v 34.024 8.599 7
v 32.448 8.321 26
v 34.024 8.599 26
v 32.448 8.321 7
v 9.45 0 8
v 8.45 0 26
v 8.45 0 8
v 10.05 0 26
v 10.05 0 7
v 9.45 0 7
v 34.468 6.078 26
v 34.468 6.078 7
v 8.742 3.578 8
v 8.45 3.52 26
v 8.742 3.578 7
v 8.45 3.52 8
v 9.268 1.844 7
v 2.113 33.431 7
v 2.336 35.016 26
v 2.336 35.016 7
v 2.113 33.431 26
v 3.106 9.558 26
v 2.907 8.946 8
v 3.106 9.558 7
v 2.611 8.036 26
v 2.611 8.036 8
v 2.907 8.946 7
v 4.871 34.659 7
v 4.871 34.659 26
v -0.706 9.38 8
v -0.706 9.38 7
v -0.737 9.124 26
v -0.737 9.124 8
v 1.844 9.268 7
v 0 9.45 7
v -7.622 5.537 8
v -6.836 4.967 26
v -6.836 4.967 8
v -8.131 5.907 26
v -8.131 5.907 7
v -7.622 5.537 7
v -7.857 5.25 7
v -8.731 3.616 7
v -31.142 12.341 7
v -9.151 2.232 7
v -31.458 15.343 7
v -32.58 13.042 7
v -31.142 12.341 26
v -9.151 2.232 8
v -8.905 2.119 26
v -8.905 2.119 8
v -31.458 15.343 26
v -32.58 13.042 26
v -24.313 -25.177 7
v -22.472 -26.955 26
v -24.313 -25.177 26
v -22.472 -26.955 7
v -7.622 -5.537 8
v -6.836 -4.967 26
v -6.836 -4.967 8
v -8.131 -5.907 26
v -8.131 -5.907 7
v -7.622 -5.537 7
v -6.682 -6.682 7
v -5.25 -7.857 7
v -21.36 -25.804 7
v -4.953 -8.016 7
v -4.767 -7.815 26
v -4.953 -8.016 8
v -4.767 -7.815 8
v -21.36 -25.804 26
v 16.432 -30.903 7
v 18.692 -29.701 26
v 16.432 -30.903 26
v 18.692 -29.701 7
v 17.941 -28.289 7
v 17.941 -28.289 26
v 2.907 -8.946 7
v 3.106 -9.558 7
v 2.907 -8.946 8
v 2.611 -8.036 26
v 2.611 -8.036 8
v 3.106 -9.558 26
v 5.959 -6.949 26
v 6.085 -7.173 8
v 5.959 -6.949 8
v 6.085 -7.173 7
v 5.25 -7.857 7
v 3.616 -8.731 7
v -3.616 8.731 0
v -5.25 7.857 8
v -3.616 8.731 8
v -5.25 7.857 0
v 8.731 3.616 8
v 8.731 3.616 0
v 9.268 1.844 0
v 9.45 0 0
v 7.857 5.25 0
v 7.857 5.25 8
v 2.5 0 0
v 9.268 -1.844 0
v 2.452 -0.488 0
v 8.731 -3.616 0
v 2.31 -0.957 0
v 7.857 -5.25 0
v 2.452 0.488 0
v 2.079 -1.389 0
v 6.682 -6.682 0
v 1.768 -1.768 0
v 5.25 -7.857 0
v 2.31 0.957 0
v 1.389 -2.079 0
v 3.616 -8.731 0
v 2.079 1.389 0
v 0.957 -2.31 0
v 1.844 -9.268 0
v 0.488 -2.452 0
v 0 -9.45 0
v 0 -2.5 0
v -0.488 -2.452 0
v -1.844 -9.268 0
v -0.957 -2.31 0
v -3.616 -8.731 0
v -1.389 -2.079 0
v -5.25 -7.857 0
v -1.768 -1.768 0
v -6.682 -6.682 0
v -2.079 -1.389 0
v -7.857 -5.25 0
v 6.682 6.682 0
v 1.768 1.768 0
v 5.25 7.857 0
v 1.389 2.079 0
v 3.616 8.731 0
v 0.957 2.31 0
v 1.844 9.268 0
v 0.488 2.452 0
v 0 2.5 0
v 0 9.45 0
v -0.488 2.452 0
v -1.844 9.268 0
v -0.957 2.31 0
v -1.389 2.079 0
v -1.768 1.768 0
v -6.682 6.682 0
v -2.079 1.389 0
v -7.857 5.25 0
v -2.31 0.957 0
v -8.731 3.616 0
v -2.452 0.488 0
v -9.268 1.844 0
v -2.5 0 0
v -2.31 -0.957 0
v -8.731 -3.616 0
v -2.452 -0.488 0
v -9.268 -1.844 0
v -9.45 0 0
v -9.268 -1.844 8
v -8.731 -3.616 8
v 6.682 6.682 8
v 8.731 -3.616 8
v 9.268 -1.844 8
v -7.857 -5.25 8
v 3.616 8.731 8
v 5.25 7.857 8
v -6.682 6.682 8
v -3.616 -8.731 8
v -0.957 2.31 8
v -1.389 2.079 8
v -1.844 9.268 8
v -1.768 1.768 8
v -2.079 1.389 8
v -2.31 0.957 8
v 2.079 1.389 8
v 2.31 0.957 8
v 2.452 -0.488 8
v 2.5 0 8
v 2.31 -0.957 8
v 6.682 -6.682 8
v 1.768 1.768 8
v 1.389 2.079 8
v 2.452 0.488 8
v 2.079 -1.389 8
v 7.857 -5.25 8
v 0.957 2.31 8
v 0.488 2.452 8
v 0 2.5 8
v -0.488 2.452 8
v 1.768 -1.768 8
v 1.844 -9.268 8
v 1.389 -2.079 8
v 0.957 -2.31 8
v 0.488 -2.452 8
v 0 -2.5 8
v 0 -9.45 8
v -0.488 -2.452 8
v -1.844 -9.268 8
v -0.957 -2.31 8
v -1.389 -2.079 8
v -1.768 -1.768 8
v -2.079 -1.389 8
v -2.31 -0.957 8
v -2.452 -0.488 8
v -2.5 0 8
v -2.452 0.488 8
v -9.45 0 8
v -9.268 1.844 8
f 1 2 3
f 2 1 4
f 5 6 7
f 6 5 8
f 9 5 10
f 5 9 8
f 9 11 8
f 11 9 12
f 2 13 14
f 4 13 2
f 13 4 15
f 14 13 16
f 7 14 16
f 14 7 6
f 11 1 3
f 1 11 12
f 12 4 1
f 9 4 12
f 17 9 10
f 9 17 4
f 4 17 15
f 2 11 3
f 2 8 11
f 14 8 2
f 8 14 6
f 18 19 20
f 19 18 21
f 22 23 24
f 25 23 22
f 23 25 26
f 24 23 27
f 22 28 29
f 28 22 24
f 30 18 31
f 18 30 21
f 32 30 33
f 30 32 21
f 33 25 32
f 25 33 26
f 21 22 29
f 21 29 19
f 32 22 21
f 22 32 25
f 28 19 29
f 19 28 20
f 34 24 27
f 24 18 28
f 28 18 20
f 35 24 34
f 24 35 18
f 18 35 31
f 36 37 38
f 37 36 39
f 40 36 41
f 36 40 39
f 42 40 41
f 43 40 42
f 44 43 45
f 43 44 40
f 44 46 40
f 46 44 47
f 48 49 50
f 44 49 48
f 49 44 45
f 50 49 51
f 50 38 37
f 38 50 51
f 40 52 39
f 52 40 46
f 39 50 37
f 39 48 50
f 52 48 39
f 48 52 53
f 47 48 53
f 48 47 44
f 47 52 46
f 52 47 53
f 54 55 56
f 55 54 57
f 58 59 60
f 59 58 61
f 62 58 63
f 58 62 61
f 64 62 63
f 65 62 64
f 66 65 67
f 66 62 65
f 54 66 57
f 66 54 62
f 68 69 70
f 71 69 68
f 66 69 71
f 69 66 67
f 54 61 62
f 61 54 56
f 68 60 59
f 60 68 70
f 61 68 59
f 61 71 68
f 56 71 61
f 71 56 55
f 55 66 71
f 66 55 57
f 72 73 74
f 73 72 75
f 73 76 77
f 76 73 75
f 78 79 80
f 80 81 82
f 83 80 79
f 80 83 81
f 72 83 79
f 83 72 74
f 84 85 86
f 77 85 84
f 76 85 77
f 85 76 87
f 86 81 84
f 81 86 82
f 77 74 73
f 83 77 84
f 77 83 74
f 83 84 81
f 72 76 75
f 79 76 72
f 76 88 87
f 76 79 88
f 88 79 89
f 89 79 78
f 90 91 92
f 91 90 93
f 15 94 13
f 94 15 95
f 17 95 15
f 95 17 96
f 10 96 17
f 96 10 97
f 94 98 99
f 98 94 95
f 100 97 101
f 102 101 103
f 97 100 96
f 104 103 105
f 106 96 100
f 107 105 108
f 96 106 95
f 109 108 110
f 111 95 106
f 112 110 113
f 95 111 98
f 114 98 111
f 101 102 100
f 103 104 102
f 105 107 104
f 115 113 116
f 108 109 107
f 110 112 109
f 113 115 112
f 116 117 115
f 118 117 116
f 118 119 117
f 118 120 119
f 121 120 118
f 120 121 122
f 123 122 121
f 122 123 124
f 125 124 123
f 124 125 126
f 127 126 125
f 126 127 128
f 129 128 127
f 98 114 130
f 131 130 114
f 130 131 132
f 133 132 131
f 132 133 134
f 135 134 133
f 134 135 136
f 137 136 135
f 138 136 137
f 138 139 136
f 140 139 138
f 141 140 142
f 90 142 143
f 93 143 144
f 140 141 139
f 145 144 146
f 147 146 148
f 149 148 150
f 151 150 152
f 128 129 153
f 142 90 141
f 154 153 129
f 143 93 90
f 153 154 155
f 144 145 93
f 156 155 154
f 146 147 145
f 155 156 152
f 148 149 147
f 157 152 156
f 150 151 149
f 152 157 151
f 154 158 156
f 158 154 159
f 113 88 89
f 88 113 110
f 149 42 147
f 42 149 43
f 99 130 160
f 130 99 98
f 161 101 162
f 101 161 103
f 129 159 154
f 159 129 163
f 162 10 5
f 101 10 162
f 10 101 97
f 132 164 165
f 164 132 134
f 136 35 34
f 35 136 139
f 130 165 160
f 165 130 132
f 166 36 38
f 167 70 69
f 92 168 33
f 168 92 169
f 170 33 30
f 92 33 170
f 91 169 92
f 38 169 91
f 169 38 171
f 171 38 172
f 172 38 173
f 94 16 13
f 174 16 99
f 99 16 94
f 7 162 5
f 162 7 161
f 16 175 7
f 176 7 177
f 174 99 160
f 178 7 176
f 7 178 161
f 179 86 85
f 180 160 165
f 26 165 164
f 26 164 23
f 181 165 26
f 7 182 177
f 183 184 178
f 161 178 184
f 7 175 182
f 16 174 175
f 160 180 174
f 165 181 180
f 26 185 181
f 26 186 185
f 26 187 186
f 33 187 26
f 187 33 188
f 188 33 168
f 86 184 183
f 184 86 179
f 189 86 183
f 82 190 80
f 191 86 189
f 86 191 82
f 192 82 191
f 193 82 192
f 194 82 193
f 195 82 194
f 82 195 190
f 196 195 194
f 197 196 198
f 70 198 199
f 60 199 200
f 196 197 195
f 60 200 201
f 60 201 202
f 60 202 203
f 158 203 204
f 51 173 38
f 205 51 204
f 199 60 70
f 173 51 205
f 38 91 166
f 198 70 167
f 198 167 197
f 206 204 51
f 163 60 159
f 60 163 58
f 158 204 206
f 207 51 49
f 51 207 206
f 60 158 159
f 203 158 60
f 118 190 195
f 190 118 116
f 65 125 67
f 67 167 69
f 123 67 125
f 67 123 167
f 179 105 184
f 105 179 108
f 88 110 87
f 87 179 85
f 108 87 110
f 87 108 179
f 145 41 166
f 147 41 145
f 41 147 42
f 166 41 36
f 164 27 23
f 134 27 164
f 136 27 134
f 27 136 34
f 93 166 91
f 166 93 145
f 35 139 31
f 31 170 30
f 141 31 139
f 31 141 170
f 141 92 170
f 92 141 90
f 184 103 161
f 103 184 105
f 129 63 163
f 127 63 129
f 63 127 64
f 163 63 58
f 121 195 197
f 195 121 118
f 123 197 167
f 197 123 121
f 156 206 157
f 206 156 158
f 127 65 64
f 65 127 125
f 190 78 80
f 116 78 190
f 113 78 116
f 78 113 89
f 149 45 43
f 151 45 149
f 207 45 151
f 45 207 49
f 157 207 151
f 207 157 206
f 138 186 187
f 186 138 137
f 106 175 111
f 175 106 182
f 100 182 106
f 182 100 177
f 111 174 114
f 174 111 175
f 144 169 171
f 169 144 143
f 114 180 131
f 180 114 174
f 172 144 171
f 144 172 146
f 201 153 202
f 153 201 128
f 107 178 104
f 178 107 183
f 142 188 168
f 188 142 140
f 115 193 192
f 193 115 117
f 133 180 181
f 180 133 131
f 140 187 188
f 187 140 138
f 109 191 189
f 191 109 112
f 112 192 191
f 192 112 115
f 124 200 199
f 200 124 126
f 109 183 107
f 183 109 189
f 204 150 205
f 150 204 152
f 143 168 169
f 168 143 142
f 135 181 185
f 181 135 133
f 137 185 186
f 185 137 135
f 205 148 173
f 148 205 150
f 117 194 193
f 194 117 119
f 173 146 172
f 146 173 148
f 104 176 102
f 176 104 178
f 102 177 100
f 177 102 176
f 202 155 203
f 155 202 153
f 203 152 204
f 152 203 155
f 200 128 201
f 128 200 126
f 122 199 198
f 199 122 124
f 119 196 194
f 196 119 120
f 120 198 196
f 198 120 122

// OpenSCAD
$fn = 32;

// ----------------------------------------------------------------------
// Impeller: 70 mm, 5 blades, 26 mm tall
// ----------------------------------------------------------------------

// --- parameters (mm) ---
hub_d = 18.9;             // hub diameter
hub_h = 8;                // hub height
imp_d = 70;               // outer diameter over the blades
blades = 5;               // number of blades
blade_t = 1.6;            // blade thickness
blade_h = 18;             // blade height
blade_in_r = 8.45;        // blade root radius
blade_out_r = 33.4;       // blade tip radius
sweep = 10;               // blade sweep, degrees
bore_d = 5;               // shaft bore

module hub() {
  cylinder(h = hub_h, d = hub_d);
}

module blade() {
  /* blade swept between two boxes: hull of the root and the tip section */
  hull() {
    translate([blade_in_r, 0, hub_h - 1])
      cube([blade_t, blade_t * 2.2, blade_h + 1], center = false);
    rotate([0, 0, sweep])
      translate([blade_out_r, 0, hub_h - 1])
        cube([blade_t, blade_t * 1.6, blade_h + 1], center = false);
  }
}

module blades() {
  for (i = [0 : blades - 1])
    rotate([0, 0, i * 360 / blades]) blade();
}

difference() {
  union() {
    hub();
    blades();
  }
  translate([0, 0, -1]) cylinder(h = hub_h + blade_h + 0 + 3, d = bore_d);
}
